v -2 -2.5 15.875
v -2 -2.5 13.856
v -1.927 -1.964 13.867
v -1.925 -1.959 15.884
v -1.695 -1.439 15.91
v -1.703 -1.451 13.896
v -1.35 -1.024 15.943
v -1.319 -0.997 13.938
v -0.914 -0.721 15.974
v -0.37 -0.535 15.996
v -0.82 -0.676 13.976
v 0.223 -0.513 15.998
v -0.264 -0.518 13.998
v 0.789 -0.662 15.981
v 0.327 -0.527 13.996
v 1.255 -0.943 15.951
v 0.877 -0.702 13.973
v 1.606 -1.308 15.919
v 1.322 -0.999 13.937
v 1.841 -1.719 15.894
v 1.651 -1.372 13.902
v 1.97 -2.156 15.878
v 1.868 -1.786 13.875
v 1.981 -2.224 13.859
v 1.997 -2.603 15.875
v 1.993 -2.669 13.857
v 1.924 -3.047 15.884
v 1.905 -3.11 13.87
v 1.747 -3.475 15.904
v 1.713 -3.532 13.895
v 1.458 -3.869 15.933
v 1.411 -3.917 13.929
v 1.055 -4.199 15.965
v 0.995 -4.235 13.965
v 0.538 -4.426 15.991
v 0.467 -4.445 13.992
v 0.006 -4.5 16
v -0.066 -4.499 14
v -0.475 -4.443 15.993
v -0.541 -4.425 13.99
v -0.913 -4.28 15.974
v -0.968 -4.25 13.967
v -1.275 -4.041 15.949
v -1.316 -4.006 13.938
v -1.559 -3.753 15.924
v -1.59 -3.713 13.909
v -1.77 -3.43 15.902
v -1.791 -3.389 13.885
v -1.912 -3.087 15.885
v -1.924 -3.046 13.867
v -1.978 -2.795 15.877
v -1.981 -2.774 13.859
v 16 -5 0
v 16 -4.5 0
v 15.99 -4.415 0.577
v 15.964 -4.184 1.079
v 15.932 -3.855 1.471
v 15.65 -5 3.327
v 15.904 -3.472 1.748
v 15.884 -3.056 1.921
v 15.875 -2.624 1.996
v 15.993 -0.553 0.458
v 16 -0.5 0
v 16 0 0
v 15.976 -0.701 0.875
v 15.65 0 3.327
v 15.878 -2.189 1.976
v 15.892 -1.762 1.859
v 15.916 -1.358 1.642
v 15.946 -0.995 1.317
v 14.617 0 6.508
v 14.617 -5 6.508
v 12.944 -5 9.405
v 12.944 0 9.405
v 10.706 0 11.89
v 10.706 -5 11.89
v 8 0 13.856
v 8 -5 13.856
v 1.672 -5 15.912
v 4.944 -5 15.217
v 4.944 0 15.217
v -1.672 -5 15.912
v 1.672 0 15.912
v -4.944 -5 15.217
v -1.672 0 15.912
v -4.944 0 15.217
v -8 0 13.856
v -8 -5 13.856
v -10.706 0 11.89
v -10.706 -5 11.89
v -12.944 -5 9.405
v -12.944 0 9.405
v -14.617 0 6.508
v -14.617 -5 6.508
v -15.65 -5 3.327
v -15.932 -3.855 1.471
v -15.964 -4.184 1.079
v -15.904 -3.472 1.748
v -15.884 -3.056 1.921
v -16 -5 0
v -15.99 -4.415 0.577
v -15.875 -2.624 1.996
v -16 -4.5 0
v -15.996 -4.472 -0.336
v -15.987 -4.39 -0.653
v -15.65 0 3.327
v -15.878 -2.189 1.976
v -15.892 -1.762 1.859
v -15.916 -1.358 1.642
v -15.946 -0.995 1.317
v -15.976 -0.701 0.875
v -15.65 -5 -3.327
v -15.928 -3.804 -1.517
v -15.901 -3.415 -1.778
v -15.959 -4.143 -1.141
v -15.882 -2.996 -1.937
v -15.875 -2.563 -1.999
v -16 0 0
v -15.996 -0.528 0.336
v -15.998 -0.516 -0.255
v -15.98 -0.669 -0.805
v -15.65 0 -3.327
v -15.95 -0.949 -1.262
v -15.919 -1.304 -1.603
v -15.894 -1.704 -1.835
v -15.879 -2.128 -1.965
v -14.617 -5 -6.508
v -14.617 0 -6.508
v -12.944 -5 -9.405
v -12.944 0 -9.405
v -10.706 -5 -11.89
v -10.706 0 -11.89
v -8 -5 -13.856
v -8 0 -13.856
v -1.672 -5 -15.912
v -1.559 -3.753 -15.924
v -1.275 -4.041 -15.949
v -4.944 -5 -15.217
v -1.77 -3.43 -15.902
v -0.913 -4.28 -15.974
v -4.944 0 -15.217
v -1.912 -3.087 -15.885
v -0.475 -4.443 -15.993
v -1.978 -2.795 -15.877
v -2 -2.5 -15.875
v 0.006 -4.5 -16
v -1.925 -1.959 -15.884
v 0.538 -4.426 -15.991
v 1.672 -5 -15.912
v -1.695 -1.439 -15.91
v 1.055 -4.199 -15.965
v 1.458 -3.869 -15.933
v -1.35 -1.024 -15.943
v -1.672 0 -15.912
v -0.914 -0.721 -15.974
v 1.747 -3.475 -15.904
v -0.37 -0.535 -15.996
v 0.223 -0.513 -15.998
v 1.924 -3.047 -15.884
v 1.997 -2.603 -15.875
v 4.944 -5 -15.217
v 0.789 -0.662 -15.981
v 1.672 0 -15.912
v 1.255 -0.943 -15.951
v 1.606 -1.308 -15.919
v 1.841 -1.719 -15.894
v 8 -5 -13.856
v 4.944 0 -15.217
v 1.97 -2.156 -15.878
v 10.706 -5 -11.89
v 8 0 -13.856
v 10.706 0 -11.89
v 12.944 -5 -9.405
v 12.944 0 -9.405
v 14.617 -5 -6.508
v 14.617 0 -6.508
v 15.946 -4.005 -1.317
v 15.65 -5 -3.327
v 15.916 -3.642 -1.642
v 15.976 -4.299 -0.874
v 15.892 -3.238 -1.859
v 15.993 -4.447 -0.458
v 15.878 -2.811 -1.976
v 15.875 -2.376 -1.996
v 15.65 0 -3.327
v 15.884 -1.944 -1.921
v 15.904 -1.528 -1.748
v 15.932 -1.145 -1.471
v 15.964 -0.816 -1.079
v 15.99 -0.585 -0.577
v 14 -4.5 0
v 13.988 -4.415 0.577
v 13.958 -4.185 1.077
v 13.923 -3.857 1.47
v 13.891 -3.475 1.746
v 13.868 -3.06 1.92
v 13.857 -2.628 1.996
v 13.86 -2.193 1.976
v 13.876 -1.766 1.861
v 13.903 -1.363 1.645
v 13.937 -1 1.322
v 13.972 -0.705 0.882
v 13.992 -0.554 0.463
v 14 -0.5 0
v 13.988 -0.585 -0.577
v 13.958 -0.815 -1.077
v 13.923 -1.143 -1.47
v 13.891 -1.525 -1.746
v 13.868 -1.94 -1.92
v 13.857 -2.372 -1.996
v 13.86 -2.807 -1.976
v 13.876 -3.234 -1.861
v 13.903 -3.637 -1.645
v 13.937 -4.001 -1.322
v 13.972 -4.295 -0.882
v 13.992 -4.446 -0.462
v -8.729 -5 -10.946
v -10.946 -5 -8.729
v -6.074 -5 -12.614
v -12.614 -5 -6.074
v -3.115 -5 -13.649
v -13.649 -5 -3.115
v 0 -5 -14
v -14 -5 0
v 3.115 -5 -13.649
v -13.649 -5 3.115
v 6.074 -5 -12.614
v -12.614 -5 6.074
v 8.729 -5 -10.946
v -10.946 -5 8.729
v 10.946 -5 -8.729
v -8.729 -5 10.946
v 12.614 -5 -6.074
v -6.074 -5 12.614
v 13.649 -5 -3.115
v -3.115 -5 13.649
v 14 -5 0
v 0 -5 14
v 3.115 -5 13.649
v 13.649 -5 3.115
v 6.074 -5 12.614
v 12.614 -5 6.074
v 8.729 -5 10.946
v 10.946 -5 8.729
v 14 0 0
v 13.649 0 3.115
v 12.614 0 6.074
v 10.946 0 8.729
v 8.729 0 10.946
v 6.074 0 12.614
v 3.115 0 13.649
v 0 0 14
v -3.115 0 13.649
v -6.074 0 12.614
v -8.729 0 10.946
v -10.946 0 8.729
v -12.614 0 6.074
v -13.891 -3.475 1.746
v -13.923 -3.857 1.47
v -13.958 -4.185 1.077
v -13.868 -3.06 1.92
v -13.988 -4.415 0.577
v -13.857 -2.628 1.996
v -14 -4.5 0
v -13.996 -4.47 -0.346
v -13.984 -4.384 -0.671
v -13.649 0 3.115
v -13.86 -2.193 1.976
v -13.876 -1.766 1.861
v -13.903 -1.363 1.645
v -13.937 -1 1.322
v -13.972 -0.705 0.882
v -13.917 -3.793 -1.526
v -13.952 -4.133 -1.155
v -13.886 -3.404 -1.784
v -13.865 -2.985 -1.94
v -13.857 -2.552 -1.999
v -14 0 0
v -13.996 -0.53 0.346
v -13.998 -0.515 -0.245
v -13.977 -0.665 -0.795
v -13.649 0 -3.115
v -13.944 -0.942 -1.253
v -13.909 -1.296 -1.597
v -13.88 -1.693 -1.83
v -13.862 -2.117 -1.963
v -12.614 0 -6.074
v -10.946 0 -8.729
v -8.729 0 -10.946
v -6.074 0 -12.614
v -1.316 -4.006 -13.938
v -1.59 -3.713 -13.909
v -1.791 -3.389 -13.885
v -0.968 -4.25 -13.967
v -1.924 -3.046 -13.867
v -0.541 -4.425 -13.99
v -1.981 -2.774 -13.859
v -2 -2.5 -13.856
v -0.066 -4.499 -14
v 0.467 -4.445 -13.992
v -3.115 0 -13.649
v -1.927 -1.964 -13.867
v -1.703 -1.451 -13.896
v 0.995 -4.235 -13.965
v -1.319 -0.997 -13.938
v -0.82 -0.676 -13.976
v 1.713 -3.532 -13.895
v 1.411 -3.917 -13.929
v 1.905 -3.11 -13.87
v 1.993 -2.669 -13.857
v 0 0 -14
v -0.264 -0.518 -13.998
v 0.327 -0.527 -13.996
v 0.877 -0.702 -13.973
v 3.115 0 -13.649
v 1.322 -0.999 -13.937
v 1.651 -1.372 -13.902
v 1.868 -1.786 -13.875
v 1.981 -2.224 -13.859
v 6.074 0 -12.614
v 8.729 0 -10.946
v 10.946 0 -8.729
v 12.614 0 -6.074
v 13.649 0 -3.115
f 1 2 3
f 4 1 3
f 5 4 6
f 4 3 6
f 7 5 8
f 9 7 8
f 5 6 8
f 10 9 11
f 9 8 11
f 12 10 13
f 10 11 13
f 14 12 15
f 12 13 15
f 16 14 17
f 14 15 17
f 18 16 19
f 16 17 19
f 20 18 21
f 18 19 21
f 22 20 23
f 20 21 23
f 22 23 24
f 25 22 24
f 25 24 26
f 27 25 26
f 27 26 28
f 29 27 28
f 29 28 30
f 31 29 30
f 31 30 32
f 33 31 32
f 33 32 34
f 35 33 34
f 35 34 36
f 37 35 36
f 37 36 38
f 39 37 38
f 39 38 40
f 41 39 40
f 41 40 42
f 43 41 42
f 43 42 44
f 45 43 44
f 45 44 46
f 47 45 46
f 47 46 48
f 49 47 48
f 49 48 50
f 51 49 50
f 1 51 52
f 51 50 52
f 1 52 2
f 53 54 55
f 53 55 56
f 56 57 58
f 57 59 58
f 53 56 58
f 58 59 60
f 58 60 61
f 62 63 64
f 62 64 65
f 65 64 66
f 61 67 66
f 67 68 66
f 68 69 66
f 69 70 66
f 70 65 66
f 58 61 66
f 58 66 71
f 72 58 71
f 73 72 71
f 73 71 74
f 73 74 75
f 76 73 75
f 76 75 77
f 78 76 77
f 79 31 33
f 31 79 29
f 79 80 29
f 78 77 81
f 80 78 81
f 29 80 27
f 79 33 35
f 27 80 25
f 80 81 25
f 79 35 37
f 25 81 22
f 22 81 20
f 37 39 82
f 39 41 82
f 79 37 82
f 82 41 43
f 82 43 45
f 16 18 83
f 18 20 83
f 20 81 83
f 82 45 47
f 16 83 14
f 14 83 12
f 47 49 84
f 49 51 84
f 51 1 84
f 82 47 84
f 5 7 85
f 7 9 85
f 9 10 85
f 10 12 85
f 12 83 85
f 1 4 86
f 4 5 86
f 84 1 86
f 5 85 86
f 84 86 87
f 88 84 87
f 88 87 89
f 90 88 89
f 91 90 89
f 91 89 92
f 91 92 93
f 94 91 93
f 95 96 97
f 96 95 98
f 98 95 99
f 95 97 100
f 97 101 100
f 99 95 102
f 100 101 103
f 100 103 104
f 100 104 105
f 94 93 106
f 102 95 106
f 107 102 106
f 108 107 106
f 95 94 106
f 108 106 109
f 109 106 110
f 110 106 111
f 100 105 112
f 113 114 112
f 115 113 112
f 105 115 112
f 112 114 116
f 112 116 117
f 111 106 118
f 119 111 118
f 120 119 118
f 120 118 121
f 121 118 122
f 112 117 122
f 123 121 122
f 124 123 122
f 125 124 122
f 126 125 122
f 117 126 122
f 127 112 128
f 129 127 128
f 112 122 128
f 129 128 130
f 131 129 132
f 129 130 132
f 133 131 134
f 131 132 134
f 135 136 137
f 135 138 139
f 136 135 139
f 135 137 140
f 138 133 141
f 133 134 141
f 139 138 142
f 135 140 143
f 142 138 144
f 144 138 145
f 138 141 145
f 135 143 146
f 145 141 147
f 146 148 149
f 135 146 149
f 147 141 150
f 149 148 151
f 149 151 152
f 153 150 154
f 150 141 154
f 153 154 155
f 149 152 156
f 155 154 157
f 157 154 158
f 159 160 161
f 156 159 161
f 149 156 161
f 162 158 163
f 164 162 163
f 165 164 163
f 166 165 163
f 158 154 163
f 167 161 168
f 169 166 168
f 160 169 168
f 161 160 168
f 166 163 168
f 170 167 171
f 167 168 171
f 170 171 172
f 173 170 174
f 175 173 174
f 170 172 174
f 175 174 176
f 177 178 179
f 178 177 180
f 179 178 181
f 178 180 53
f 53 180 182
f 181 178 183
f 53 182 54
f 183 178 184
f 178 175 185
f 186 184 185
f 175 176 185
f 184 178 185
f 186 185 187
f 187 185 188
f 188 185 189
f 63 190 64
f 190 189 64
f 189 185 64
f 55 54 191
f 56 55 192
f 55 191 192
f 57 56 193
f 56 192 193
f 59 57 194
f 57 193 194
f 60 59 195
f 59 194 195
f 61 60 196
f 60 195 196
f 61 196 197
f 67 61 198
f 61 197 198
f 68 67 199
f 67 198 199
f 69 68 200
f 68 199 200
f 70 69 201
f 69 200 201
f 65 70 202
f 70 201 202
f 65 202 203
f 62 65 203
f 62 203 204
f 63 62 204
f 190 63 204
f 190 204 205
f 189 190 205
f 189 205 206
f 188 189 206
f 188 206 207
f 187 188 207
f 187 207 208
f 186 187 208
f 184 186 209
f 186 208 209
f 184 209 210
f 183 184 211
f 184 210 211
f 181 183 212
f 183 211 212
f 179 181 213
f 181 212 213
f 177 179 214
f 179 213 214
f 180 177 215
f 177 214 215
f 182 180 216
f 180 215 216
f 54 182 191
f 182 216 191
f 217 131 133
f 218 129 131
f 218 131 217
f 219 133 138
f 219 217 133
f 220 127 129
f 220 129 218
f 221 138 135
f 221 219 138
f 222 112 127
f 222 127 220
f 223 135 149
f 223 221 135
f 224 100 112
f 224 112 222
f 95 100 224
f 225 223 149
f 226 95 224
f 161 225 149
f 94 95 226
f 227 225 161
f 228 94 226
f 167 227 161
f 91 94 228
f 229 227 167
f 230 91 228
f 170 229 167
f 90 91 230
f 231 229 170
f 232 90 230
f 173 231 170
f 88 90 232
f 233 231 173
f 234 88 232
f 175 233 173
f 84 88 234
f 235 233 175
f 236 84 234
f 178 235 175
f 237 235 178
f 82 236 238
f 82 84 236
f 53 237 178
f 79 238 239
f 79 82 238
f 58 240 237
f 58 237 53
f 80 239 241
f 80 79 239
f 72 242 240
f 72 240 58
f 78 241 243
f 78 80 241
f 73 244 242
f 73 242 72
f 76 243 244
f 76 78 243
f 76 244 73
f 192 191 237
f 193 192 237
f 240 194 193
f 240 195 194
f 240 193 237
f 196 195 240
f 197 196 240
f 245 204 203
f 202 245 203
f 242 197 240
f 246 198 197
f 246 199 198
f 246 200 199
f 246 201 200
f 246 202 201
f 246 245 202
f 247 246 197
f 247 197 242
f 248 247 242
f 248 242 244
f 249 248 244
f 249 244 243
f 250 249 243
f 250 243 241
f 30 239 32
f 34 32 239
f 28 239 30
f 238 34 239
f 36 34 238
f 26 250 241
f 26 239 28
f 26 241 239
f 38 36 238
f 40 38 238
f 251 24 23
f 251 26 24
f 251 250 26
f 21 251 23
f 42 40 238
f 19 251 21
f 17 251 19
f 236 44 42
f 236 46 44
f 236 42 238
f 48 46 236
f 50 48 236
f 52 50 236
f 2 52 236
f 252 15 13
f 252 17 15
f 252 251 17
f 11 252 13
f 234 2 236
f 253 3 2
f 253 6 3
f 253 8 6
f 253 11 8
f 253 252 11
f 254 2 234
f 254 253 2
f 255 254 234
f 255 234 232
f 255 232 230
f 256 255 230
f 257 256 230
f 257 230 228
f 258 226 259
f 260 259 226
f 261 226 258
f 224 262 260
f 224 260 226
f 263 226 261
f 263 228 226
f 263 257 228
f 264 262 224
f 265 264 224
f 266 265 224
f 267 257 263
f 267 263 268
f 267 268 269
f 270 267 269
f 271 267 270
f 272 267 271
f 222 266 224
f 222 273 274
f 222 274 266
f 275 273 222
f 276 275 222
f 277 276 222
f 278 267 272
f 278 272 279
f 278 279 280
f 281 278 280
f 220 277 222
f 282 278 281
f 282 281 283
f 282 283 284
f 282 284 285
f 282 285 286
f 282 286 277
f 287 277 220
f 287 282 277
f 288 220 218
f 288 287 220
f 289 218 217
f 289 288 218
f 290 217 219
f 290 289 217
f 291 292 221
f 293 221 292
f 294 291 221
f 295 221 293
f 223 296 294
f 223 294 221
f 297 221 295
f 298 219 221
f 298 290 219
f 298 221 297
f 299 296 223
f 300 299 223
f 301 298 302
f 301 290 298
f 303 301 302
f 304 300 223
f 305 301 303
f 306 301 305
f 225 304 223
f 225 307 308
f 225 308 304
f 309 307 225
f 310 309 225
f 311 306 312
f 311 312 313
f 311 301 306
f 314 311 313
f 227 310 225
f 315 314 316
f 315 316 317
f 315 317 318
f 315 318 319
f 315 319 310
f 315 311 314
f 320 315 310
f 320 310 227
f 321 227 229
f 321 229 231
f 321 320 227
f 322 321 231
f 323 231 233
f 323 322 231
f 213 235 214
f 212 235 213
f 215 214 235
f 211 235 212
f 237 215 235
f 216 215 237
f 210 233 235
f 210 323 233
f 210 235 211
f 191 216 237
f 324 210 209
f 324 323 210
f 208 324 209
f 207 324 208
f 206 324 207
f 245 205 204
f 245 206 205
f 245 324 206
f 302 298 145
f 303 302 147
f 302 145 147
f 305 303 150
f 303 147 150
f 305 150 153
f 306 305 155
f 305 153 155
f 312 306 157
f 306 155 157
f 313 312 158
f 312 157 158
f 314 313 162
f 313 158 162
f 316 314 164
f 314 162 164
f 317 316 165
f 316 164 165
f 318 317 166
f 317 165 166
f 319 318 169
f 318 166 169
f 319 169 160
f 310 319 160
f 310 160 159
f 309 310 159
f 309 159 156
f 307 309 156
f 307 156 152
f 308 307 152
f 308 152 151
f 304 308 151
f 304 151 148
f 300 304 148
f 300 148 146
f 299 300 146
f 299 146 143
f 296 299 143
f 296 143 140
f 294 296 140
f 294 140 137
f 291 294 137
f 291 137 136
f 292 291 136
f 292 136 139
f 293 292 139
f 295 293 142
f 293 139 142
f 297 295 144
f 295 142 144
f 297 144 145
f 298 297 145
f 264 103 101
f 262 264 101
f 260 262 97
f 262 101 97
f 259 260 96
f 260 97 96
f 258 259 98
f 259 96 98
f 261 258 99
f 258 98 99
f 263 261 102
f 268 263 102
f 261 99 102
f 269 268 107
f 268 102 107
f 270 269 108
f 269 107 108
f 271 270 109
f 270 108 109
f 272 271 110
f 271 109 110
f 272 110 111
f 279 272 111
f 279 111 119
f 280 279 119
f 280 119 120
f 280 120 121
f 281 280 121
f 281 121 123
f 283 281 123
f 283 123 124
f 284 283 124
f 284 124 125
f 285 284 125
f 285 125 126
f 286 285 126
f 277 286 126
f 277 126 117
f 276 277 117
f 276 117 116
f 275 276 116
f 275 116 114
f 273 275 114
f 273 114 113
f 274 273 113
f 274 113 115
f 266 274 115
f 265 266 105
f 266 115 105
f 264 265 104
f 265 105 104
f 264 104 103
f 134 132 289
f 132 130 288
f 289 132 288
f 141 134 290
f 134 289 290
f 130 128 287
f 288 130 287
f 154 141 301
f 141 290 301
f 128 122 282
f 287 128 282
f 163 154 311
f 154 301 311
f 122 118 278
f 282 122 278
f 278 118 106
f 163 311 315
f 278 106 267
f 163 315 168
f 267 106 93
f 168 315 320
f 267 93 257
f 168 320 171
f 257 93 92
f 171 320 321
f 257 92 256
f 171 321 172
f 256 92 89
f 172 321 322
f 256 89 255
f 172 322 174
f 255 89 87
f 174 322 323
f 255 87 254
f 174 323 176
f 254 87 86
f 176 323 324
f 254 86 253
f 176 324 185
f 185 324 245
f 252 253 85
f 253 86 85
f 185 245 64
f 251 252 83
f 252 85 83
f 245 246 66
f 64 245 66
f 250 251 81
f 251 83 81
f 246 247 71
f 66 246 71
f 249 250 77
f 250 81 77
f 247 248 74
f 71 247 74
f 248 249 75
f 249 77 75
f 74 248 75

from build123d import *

# Parameters (mm, degrees)
F0_R     = 16
F0_R_2   = 14
F1_DEPTH = 5
F4_D     = 4
F7_D     = 4


with BuildPart() as f1:
    # F0 (on Front) → F1 (new body)
    with BuildSketch(Plane.XZ):
        Circle(F0_R)
        Circle(F0_R_2, mode=Mode.SUBTRACT)
    extrude(amount=F1_DEPTH)

    # F4 (through all)
    with Locations(Plane.YZ.offset(16)):
        with Locations((-2.5, 0)):
            Hole(F4_D / 2)

    # F7 (through all)
    with Locations(Plane.XY.offset(16)):
        with Locations((0, -2.5)):
            Hole(F7_D / 2)


solid = f1.part
